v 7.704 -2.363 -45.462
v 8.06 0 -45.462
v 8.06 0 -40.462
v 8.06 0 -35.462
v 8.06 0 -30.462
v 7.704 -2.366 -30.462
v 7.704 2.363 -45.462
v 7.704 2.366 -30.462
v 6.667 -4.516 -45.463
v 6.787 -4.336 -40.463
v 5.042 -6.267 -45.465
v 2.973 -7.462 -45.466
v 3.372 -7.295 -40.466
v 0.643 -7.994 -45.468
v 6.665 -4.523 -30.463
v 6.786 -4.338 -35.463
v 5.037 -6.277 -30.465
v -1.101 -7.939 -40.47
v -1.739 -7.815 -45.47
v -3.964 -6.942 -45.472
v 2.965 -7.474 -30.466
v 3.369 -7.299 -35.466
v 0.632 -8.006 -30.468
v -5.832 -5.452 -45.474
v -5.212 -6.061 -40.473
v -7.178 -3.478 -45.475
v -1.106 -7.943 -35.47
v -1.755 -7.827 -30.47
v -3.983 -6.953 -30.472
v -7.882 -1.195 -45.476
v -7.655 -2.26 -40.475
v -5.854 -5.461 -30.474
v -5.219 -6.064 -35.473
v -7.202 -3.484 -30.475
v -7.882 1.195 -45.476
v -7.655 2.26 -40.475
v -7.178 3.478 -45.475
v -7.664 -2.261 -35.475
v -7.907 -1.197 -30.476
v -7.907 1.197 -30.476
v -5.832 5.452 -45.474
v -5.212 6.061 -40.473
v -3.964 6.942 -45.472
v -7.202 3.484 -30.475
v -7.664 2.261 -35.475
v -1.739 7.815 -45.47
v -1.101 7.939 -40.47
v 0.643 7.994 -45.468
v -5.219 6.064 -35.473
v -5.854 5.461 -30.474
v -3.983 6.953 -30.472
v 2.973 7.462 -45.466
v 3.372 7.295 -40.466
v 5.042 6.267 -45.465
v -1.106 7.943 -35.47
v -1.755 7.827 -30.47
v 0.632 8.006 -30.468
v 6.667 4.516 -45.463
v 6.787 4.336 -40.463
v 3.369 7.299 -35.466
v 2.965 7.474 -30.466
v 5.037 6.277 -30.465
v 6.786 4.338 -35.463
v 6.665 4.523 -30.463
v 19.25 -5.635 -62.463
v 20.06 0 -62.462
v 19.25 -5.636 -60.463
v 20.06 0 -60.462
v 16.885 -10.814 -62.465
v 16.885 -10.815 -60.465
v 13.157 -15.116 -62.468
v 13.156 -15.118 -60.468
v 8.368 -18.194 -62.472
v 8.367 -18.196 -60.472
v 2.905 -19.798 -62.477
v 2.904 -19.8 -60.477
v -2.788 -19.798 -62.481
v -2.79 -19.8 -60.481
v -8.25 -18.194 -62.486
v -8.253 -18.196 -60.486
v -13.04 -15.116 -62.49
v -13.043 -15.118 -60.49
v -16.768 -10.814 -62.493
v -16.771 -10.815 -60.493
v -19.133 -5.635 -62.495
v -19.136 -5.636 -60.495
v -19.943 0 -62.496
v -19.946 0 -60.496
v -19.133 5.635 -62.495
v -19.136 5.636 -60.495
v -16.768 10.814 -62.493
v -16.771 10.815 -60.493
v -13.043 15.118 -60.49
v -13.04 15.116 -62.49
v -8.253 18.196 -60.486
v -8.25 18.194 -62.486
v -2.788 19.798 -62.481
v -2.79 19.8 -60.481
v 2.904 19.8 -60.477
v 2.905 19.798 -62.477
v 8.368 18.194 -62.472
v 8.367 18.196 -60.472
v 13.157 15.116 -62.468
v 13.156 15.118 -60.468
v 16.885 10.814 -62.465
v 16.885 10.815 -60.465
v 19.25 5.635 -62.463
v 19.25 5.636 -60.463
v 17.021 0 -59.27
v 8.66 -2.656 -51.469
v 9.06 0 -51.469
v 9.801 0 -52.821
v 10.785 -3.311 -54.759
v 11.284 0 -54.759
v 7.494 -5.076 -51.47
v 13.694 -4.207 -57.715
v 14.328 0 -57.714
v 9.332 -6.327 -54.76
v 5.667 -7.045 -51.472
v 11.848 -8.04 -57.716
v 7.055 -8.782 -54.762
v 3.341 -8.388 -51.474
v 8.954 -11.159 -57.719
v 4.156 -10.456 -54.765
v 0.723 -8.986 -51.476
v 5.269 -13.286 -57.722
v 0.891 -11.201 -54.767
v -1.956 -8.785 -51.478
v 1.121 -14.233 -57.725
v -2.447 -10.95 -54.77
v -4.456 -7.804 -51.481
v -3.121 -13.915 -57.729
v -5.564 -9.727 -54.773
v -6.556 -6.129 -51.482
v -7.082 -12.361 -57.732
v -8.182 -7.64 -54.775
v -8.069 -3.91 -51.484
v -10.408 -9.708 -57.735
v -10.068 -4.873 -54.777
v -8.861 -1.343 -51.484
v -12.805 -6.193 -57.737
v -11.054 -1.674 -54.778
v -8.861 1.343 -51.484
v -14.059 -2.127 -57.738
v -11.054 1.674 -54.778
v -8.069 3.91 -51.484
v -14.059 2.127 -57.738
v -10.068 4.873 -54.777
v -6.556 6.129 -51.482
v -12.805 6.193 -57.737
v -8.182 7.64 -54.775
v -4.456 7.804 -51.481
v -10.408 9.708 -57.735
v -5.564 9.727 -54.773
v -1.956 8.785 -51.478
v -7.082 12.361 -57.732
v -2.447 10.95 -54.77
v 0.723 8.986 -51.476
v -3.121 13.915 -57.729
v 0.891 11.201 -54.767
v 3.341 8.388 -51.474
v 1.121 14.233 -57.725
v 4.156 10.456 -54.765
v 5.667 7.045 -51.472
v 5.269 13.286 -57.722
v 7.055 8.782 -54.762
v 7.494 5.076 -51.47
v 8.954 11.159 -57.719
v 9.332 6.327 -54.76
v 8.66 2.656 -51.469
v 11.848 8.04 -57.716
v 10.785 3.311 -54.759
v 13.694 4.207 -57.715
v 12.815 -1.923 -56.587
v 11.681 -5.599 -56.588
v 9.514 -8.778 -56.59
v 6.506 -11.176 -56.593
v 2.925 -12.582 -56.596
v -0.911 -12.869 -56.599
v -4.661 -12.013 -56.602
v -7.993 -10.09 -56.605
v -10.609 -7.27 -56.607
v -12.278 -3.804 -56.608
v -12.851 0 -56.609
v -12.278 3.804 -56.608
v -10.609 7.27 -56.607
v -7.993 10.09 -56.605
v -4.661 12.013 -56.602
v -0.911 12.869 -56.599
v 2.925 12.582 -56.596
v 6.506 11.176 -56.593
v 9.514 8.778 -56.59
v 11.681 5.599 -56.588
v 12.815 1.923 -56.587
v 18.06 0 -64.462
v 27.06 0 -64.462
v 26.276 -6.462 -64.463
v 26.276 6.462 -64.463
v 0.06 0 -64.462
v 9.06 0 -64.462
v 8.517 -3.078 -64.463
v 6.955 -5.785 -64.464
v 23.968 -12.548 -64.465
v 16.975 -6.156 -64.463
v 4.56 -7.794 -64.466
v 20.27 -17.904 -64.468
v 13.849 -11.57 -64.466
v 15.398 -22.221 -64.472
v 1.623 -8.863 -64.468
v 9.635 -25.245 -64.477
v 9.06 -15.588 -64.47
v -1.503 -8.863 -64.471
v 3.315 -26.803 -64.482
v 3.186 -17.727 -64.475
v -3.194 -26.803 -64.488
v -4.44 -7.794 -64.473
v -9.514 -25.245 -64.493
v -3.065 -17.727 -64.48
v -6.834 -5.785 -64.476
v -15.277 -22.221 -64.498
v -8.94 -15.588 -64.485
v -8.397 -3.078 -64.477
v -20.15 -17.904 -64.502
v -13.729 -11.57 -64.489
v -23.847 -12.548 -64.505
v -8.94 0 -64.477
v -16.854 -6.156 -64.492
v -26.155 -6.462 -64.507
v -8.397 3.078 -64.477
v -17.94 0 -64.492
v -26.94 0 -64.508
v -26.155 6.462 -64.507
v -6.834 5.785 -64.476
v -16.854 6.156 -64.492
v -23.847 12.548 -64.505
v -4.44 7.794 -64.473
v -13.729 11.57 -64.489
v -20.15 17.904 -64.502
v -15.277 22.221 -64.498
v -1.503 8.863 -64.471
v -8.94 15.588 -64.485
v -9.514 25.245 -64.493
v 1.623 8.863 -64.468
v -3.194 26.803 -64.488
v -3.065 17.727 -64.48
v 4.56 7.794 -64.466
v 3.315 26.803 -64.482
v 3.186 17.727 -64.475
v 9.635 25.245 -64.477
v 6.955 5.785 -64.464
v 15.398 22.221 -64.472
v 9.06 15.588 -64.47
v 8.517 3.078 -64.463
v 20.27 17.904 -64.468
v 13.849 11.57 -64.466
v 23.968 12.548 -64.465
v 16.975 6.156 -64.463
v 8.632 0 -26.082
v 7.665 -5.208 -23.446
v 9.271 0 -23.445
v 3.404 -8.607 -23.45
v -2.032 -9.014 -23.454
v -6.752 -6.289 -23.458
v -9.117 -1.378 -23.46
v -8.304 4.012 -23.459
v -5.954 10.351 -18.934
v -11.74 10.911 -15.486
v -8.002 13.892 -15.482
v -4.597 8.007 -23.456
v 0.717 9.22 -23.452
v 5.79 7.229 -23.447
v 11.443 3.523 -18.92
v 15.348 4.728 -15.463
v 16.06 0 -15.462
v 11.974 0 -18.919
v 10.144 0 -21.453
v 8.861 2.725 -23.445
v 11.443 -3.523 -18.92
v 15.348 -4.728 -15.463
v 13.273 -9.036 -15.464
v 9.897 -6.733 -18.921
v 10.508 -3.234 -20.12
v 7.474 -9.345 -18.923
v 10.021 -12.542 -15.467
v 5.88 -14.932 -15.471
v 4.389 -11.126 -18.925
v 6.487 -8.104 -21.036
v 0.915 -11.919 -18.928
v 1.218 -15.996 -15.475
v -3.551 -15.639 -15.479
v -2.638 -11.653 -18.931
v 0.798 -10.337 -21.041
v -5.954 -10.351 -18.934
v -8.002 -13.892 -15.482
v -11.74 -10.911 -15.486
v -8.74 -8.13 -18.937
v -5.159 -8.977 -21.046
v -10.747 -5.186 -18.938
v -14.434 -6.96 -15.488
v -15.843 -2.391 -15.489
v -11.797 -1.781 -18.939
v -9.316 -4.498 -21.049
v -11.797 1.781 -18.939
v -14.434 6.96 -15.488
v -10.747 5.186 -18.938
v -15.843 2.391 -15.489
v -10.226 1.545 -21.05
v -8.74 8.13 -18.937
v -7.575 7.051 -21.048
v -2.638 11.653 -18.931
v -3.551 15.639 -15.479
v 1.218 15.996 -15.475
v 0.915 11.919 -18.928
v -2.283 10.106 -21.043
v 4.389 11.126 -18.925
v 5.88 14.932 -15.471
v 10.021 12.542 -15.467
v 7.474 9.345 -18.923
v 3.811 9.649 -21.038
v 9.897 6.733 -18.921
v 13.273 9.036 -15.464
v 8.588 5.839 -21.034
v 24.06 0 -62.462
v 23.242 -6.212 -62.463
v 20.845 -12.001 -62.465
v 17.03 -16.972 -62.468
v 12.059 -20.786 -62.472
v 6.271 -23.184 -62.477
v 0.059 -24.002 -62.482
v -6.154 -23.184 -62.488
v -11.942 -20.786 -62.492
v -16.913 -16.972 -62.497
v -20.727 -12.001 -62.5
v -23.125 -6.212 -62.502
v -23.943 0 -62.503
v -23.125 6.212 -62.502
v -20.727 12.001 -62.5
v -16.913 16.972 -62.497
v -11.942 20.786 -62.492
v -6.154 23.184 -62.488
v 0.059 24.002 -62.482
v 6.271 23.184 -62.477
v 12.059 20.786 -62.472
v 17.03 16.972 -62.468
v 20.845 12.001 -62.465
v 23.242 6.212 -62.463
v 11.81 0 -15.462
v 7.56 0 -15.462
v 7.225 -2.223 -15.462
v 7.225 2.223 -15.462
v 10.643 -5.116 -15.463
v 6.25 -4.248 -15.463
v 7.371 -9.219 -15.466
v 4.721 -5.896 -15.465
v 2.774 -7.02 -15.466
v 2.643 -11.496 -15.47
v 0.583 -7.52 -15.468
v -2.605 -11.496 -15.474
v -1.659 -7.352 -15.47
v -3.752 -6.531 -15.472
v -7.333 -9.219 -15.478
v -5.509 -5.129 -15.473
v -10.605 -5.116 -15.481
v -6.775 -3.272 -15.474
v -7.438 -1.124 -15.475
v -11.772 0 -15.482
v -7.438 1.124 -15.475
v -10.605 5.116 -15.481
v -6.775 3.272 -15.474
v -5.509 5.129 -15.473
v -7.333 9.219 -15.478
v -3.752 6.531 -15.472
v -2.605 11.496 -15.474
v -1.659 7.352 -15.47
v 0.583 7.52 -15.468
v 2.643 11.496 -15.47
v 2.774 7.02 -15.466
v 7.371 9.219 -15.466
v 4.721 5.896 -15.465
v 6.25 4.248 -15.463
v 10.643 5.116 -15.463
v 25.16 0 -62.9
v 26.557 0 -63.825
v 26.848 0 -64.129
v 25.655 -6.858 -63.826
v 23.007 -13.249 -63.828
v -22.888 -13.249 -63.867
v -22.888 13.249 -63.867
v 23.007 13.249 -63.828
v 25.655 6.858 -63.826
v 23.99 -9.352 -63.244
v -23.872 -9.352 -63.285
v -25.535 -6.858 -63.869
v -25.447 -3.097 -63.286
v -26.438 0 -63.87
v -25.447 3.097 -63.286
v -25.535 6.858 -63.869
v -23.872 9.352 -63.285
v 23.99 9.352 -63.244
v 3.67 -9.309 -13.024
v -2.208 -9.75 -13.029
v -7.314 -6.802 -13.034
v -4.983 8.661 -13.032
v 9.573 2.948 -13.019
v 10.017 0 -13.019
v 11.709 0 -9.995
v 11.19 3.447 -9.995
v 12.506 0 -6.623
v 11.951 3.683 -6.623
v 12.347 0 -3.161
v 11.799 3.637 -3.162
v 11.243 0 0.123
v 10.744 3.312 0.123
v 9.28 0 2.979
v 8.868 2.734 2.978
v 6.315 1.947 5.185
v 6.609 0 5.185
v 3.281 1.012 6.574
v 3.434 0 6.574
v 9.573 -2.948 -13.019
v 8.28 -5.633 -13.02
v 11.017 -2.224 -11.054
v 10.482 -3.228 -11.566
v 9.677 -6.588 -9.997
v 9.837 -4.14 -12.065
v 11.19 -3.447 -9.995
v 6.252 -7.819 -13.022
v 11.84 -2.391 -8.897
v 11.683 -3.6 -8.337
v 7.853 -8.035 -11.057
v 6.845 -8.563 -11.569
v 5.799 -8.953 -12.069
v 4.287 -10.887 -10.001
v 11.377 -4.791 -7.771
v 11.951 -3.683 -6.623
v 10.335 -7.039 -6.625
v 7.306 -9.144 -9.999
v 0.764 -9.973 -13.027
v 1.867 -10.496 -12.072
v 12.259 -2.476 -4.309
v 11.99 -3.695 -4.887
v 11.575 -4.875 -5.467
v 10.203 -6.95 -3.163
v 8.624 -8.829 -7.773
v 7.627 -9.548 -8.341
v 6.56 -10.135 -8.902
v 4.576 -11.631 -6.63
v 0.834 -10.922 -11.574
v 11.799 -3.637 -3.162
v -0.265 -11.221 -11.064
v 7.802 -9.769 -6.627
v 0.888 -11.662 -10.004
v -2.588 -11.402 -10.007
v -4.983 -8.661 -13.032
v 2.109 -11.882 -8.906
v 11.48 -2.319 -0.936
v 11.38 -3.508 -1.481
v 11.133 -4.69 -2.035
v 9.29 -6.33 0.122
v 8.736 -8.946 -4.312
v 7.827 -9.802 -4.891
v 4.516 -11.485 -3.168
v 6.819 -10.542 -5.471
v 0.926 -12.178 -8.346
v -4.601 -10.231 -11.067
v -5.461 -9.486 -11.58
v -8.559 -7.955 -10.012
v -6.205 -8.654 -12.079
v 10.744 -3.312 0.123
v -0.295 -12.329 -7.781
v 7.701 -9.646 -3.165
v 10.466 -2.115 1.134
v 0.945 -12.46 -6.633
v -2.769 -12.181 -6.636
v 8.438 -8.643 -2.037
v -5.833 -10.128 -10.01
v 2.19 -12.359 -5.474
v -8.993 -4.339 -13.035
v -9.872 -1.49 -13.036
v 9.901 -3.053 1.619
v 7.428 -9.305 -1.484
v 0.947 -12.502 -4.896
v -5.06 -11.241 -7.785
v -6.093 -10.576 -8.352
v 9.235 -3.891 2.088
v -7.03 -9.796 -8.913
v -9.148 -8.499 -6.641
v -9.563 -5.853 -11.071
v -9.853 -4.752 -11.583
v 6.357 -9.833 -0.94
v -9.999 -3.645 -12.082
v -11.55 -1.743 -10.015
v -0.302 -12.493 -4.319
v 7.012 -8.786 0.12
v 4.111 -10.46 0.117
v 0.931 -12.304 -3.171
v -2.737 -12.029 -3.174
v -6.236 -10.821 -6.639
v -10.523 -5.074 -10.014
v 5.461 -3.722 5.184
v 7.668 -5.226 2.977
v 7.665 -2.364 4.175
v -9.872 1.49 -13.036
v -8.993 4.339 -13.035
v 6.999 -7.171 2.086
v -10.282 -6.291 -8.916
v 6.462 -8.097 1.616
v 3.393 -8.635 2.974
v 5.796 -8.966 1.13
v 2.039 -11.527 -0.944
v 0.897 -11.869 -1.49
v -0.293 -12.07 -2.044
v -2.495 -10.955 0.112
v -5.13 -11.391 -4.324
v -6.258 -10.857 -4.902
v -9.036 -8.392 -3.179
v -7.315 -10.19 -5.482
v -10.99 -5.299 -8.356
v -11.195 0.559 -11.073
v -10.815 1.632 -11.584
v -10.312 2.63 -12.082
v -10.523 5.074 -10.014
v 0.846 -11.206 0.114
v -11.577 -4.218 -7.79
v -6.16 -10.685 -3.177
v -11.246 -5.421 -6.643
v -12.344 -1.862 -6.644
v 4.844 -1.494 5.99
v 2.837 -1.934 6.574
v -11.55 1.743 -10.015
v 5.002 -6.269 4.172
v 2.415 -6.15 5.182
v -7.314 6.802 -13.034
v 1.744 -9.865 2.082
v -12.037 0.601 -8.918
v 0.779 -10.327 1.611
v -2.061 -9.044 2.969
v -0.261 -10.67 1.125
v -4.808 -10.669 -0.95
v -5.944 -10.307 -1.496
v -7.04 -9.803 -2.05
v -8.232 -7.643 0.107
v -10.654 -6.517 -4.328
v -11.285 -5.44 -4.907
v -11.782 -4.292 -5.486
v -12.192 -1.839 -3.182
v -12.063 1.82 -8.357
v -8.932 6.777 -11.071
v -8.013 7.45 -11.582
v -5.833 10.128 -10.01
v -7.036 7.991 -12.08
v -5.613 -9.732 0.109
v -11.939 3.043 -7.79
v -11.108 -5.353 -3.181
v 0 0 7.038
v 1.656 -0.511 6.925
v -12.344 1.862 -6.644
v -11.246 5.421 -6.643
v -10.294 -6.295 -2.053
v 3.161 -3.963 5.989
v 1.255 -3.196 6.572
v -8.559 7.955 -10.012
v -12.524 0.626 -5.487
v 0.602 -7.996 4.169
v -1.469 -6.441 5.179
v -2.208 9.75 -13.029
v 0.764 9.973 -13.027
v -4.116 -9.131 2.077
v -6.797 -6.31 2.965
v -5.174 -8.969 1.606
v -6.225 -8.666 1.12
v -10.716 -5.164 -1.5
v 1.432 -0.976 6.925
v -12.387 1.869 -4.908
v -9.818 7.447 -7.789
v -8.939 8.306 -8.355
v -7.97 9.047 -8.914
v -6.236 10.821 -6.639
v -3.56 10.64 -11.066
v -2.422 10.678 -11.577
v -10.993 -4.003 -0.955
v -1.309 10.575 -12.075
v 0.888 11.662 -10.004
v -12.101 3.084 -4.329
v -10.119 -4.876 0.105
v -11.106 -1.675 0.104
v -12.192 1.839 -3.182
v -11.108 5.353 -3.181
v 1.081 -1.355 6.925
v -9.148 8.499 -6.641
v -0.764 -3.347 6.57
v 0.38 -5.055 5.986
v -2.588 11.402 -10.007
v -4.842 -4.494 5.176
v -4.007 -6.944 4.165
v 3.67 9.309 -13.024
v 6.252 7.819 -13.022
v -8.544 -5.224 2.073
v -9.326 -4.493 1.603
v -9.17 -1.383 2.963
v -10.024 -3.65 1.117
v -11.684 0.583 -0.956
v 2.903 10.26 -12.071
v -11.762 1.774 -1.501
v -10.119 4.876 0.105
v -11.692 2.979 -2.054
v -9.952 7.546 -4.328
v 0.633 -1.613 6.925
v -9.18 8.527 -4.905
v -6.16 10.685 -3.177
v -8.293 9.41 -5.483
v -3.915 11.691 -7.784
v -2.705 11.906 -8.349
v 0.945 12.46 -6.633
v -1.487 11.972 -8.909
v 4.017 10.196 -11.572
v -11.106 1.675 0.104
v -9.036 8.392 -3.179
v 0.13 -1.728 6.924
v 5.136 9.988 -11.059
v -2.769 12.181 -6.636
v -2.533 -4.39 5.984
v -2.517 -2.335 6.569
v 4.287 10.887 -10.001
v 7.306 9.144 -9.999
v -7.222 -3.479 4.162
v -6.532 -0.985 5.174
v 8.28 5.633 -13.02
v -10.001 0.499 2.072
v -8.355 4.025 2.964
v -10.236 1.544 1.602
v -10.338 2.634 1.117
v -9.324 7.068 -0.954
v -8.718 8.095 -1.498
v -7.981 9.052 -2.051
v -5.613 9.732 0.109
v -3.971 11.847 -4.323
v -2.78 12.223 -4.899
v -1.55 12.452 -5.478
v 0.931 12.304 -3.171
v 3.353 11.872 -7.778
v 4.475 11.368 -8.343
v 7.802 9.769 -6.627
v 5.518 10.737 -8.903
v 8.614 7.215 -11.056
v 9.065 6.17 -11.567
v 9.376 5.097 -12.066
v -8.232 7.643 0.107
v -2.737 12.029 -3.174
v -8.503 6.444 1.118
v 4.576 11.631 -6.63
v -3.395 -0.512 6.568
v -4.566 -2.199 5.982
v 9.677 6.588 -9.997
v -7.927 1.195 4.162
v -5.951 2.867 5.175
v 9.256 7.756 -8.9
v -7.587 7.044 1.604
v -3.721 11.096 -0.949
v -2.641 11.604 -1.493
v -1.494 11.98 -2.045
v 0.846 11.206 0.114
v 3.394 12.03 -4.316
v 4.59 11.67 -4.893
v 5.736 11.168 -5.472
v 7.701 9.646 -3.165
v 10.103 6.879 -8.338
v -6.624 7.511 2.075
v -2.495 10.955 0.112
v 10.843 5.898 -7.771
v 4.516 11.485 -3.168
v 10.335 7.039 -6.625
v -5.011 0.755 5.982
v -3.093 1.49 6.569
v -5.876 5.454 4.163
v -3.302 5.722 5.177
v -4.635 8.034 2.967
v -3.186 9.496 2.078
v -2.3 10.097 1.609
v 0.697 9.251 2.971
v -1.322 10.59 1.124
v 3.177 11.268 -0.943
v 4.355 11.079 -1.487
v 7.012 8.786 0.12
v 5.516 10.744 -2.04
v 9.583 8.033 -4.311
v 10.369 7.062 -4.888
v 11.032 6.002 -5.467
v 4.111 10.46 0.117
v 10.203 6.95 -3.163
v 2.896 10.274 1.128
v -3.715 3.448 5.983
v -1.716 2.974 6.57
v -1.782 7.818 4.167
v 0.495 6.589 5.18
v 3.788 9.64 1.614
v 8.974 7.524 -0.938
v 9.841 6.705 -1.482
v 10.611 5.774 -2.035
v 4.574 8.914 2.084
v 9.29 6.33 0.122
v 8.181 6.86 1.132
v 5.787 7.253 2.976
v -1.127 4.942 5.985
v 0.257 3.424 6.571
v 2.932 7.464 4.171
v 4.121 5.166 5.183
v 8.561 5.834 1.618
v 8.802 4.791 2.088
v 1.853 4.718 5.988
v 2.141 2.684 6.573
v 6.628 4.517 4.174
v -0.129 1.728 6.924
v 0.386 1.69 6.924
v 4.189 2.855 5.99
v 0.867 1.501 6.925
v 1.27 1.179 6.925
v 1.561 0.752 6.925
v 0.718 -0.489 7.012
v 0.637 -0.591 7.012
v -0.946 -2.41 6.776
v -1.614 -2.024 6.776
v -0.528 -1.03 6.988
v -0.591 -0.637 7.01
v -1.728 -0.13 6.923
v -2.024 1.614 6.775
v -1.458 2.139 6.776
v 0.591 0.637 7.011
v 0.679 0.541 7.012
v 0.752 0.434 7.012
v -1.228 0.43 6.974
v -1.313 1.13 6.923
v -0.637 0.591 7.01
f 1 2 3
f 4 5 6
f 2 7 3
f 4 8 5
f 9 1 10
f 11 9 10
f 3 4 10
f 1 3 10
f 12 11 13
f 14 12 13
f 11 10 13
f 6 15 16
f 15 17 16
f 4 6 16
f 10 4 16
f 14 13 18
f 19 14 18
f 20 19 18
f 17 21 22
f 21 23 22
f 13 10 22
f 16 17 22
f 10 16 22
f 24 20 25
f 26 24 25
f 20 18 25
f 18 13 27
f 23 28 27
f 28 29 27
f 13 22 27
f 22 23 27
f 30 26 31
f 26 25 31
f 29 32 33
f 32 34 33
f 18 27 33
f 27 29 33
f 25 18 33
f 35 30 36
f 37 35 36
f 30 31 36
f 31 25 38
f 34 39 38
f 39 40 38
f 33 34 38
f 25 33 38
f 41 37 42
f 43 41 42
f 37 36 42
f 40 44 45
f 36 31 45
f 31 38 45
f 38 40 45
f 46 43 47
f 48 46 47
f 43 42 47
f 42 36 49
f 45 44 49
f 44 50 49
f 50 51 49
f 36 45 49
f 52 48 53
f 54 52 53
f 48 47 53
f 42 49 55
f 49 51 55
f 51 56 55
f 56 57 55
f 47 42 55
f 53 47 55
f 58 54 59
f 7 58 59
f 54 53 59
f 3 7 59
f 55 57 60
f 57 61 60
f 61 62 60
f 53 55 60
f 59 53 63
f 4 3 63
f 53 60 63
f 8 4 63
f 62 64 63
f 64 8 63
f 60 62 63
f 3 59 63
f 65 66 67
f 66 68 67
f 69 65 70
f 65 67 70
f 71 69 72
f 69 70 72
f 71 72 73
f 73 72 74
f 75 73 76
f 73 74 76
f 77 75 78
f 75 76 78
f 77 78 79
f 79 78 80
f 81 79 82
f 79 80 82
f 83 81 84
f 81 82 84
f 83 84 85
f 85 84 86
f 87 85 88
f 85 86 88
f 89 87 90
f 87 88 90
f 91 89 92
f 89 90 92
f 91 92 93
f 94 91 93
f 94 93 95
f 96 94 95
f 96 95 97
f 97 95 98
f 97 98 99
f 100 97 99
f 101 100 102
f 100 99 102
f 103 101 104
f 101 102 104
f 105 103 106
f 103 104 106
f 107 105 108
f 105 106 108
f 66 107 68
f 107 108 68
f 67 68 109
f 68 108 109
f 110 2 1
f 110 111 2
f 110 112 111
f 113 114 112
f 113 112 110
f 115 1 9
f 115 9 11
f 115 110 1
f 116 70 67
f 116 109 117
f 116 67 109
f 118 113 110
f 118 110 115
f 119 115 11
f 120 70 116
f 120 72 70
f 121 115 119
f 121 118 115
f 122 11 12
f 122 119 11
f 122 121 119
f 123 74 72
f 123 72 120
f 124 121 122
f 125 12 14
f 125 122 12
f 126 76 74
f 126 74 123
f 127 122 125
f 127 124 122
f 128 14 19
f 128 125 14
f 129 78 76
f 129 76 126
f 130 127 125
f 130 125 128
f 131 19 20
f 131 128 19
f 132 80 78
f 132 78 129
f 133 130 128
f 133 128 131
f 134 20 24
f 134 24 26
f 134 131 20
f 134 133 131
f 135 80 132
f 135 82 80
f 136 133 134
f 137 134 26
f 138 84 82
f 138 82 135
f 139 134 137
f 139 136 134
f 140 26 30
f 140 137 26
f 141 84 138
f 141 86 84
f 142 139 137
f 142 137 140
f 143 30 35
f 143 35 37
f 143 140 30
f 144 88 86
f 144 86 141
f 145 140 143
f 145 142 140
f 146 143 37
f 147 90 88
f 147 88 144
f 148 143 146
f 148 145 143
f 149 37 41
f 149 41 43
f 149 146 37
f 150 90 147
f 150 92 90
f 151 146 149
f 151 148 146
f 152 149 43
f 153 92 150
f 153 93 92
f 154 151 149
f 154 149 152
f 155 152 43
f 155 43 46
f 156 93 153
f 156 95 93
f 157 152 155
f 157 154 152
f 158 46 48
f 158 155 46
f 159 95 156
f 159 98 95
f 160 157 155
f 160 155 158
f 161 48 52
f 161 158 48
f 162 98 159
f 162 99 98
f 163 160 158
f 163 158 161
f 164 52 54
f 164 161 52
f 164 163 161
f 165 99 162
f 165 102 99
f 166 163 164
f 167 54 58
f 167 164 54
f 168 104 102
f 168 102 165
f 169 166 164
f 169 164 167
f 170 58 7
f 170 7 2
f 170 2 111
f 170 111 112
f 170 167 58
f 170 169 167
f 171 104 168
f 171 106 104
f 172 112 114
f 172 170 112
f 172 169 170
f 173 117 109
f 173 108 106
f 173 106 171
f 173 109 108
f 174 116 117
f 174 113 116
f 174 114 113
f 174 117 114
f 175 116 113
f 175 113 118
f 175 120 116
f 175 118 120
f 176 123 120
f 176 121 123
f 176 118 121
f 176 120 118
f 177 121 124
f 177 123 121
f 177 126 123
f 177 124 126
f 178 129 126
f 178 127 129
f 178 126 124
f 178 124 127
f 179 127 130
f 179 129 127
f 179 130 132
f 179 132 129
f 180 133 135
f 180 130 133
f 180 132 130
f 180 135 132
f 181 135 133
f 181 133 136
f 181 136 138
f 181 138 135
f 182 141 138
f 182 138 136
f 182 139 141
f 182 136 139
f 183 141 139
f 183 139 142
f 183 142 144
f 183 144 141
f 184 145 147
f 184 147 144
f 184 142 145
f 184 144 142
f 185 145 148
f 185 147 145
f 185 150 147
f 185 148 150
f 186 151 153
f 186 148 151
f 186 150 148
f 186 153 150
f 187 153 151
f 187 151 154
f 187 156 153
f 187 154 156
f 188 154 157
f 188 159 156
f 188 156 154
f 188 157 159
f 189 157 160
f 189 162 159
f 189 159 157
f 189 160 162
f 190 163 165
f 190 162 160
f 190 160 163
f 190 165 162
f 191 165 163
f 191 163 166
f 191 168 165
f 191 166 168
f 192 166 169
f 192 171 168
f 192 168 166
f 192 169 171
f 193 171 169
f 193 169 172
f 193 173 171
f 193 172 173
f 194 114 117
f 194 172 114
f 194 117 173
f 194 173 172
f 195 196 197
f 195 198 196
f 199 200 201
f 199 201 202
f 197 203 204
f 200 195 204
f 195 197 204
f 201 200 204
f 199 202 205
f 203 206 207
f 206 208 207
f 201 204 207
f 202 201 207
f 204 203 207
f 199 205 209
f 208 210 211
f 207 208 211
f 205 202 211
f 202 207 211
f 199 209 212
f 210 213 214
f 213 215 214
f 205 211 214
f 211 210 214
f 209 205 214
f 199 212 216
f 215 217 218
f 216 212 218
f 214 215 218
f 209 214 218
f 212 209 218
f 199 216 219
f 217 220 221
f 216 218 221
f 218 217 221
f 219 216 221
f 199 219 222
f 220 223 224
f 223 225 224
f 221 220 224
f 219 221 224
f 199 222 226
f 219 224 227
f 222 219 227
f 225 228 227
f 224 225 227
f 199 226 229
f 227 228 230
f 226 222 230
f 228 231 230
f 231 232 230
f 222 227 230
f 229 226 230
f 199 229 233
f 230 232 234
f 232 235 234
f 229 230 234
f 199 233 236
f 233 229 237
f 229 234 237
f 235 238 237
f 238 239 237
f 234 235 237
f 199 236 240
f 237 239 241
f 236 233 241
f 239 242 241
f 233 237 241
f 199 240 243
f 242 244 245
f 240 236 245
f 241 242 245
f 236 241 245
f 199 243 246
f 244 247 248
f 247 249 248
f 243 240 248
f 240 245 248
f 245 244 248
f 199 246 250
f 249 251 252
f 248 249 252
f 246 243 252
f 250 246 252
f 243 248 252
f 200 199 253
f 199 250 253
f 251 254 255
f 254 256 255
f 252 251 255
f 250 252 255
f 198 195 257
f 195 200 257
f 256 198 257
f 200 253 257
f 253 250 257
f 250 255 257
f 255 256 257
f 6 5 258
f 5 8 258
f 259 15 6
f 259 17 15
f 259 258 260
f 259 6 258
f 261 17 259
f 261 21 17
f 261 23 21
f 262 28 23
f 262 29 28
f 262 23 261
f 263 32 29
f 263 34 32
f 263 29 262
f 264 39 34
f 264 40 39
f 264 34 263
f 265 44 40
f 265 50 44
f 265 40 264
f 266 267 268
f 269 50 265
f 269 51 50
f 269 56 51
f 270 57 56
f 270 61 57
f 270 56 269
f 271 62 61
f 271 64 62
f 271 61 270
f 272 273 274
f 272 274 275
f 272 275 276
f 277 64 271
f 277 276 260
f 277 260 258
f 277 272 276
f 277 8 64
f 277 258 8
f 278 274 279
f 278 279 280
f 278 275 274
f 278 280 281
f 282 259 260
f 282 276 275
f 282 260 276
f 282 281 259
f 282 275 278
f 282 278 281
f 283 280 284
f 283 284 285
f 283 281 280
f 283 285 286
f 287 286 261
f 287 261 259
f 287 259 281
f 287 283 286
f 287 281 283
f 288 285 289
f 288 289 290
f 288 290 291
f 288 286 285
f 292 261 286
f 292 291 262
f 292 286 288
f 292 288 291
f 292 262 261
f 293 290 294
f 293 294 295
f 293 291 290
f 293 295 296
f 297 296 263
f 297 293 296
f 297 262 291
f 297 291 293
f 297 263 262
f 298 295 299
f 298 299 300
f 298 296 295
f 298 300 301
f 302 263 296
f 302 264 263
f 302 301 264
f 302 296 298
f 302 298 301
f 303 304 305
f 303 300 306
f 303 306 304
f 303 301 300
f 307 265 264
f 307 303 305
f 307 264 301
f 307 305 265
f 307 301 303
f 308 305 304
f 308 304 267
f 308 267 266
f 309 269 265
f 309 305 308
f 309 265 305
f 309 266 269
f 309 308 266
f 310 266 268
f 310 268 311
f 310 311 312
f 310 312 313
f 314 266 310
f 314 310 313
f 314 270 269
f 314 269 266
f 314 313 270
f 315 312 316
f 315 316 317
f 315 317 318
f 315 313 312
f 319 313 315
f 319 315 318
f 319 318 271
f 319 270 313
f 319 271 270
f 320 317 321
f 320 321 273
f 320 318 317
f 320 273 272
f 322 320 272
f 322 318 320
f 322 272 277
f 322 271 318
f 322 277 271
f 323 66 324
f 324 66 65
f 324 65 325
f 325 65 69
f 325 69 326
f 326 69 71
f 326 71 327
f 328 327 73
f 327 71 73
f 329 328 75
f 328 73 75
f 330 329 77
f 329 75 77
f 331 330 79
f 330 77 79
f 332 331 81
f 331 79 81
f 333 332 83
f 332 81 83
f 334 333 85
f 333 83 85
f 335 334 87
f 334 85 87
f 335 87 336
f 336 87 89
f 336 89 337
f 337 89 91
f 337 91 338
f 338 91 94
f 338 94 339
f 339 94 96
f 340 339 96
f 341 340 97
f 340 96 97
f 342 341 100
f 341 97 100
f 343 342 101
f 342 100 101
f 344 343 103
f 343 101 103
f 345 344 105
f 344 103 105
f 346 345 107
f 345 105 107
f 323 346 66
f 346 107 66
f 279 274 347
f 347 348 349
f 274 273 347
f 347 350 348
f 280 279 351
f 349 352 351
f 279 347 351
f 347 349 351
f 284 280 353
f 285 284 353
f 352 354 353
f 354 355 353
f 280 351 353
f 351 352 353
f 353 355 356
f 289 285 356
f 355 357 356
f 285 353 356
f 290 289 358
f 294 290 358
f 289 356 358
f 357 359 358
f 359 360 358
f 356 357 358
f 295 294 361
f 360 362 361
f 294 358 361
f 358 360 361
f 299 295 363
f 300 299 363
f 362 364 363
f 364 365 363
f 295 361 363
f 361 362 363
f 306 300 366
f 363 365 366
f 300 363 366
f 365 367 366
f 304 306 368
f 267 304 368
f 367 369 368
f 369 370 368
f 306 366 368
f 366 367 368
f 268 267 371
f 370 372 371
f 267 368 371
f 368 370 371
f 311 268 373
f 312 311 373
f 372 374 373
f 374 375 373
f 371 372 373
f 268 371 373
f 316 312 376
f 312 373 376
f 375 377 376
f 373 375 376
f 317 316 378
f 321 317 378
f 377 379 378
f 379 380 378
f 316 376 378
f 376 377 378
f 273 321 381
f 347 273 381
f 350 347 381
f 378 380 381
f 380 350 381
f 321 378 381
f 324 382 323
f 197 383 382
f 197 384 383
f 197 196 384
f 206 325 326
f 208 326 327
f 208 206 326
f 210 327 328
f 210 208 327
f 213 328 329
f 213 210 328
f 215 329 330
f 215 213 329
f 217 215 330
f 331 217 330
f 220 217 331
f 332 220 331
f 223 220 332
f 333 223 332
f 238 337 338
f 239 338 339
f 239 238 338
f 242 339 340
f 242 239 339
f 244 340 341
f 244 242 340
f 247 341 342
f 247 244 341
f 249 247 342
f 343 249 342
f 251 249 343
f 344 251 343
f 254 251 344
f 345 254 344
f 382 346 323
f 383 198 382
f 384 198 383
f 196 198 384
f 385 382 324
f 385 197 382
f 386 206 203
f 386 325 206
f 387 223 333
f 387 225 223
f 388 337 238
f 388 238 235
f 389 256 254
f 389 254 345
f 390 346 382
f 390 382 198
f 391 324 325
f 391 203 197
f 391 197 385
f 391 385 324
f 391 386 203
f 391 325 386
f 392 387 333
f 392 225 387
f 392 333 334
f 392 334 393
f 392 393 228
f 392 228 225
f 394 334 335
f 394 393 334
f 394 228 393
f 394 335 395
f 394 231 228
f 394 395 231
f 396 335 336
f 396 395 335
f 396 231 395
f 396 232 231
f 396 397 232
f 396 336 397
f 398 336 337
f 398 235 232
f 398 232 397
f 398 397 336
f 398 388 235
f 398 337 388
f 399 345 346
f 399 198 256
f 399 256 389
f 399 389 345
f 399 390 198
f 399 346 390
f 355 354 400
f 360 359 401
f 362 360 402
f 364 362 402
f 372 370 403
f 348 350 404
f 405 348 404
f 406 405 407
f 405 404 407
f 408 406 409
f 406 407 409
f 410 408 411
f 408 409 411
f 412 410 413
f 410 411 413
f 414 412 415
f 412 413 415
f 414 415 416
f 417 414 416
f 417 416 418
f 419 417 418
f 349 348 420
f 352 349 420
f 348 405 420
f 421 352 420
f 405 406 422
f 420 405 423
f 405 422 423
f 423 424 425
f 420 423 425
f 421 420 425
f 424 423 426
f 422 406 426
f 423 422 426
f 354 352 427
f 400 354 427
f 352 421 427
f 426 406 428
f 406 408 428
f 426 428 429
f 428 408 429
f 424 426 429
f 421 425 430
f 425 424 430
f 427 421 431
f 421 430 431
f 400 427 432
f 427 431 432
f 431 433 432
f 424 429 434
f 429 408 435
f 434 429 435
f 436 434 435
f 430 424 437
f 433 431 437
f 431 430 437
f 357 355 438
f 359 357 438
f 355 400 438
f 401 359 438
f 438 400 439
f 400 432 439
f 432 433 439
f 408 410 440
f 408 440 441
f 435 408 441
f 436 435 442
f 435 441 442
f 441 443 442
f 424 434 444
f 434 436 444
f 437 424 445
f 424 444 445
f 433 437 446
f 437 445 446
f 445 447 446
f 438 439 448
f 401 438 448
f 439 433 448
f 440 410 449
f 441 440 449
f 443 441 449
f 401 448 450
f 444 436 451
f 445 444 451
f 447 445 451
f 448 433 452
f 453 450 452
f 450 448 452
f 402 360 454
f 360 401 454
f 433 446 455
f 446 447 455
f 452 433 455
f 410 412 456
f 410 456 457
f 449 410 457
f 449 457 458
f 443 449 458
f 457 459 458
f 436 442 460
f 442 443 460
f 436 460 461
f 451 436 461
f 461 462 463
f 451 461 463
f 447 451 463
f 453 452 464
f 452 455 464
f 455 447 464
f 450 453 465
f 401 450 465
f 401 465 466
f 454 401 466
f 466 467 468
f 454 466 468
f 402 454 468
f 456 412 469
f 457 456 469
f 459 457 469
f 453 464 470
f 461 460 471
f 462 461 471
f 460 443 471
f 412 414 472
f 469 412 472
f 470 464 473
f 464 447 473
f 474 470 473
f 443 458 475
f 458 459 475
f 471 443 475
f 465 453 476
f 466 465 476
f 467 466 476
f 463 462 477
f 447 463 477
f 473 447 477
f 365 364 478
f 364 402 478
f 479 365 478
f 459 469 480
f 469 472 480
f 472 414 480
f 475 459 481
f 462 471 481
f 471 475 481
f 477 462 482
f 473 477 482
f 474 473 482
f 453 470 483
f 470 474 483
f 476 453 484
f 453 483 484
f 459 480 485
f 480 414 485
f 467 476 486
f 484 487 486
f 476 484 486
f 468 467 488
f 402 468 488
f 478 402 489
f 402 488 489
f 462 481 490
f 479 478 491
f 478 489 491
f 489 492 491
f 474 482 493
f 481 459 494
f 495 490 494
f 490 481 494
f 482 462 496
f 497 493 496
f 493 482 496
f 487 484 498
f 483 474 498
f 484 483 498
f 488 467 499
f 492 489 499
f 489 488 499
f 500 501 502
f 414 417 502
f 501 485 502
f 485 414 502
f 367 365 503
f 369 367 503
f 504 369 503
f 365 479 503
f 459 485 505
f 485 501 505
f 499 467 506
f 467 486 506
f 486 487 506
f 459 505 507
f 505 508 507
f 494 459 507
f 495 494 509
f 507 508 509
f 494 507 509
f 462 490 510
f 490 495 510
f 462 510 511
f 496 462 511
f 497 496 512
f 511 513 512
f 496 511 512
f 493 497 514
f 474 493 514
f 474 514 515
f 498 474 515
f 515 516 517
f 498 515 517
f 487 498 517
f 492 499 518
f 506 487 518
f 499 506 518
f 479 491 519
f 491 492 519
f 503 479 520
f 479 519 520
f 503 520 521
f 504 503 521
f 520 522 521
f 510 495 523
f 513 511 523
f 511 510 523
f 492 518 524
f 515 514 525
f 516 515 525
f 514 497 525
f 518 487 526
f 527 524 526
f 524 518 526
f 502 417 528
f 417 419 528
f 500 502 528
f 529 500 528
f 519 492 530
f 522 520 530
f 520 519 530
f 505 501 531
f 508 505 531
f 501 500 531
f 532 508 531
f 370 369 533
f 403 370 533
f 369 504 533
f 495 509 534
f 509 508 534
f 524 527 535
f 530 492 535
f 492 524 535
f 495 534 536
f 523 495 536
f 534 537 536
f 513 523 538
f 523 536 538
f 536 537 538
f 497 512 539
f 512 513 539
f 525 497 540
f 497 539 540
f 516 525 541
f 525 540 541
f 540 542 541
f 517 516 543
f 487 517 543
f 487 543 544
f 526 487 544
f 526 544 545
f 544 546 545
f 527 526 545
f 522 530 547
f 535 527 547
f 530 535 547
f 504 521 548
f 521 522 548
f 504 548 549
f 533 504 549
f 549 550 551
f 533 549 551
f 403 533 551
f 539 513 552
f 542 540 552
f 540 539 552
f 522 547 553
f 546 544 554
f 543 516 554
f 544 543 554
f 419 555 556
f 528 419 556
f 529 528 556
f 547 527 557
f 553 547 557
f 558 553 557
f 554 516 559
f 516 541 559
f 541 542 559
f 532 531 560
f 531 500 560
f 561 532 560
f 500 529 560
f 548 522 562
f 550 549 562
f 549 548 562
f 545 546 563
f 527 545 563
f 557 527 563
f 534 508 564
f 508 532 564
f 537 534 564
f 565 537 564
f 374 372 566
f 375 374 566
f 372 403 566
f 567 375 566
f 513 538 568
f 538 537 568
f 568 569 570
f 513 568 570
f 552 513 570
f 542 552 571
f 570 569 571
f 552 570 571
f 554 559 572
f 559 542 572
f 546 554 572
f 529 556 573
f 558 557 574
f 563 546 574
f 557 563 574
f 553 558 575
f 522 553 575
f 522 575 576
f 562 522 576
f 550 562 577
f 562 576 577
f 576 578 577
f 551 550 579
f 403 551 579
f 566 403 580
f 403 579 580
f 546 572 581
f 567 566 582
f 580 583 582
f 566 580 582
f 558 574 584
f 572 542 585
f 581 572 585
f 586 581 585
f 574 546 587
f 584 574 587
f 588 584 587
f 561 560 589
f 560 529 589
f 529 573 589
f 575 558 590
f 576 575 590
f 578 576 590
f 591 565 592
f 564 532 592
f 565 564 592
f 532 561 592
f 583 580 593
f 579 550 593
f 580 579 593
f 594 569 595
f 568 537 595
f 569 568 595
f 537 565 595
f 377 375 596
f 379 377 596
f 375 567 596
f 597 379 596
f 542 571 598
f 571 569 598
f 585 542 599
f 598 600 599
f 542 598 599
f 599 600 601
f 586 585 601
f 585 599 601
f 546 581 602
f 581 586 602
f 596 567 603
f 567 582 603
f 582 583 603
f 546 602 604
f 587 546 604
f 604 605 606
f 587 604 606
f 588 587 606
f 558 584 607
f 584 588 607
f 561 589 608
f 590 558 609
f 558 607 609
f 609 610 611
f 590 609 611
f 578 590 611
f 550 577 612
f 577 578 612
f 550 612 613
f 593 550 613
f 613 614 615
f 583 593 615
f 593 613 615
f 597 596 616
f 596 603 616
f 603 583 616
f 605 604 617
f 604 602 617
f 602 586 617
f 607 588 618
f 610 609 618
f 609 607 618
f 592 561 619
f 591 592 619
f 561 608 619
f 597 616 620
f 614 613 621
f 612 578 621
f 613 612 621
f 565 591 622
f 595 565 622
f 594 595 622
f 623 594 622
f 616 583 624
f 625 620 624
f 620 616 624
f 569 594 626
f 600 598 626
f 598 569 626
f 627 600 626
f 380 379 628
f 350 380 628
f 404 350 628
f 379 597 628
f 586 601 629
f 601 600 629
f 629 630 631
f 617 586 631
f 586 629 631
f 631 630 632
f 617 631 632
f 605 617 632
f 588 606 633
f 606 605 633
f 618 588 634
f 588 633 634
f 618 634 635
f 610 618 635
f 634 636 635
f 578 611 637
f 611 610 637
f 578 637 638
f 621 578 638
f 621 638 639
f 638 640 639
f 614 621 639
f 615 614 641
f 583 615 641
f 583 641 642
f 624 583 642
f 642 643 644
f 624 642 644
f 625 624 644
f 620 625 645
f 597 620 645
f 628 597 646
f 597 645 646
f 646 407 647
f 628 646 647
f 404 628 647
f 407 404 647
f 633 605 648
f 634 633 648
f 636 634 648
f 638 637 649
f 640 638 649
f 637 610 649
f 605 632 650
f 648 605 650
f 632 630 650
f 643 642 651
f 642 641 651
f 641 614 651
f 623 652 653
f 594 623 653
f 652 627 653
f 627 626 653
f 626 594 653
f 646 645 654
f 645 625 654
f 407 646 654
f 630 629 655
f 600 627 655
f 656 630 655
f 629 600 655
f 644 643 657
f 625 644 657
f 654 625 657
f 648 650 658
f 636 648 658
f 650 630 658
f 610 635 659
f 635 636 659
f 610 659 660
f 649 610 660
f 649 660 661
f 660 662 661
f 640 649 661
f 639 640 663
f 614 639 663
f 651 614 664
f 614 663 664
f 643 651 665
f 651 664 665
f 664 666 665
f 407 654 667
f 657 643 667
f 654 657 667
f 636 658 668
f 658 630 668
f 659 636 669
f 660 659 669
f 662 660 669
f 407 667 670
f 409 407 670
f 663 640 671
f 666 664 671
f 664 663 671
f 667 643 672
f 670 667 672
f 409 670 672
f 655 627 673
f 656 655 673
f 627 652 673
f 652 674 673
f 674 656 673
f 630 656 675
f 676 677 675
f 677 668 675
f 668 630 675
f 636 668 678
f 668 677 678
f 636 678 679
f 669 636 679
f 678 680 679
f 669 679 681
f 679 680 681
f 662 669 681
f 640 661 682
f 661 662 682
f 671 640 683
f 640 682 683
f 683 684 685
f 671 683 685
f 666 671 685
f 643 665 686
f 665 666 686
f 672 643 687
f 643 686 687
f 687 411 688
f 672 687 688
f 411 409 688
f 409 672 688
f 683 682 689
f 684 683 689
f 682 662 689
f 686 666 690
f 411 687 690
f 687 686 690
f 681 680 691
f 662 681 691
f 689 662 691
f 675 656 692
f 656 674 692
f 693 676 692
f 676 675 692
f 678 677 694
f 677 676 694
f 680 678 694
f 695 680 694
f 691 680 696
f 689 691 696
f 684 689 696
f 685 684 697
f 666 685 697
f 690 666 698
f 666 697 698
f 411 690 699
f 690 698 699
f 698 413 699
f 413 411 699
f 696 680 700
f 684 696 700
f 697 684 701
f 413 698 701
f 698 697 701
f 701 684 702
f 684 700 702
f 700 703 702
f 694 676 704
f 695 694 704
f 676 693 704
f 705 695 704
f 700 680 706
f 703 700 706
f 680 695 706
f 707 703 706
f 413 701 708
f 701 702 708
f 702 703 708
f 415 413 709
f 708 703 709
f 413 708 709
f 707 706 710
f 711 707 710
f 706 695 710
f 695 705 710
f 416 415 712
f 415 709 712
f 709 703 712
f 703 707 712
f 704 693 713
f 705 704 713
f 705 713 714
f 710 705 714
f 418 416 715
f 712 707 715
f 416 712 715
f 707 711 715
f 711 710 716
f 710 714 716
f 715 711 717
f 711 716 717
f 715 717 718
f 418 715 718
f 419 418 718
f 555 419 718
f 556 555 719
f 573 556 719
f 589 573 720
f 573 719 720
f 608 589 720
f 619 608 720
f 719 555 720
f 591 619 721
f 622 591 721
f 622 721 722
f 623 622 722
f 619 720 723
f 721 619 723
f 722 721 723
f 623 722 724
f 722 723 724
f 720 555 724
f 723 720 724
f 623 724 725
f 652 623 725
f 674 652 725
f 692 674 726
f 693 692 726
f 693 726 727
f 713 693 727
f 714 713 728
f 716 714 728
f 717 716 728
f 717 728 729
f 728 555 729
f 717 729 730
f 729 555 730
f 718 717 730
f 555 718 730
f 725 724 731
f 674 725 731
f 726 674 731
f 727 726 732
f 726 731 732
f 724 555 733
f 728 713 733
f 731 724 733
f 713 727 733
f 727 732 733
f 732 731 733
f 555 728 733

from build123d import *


with BuildPart() as f1:
    # F0 (on Front) → F1 (revolve)
    with BuildSketch(Plane.XZ):
        with BuildLine():
            Line((16.0602549567, -15.4621153726), (7.5602549567, -15.4621153726))
            ThreePointArc((7.5602549567, -15.4621153726), (11.9092345657, -1.4806982601), (0, 7.0377394002))
            Line((0, 7.0377394002), (0.0210680353, -17.9620539479))
            Line((0.0210680353, -17.9620539479), (0.0602549567, -64.4621153726))
            Line((0.0602549567, -64.4621153726), (27.0602549567, -64.4621153726))
            add(Edge.make_bspline(
                [(24.0602549567, -62.4621153726), (24.2976343533, -62.5299482609), (24.6610161779, -62.659273132), (25.3953288411, -63.000628175), (26.1296100935, -63.488961221), (26.6120109423, -63.8396804611), (26.9844977473, -64.2711132928), (27.0602549567, -64.4621153726)],
                knots=[0, 0, 0, 0, 0.1871194335, 0.395890859, 0.6146239818, 0.7997660524, 1, 1, 1, 1], degree=3))
            Line((24.0602549567, -62.4621153726), (20.0602549567, -62.4621153726))
            Line((20.0602549567, -62.4621153726), (20.0602549567, -60.4621153726))
            add(Edge.make_bspline(
                [(8.0602549567, -45.4621153726), (8.1202179338, -46.2604888161), (8.4882346329, -48.7671795342), (8.8159630246, -51.106048365), (9.7836826184, -53.012188928), (12.8822067968, -56.7280350203), (14.674401585, -57.9681740481), (16.0955126132, -58.8286453234), (17.1337599051, -59.3246168108), (18.2158143663, -59.8336196795), (19.4334469038, -60.3452031361), (20.0602549567, -60.4621153726)],
                knots=[0, 0, 0, 0, 0.1359045694, 0.2517978021, 0.3615656635, 0.5258739798, 0.6392079546, 0.7333337546, 0.8126882779, 0.8949414167, 1, 1, 1, 1], degree=3))
            Line((8.0602549567, -45.4621153726), (8.0602549567, -30.4621153726))
            add(Edge.make_bspline(
                [(16.0602549567, -15.4621153726), (15.6748016449, -15.7156297876), (14.8363137229, -16.2524384887), (13.3584036697, -17.6179345625), (11.8257365644, -18.9579435855), (10.3041434737, -21.0251573137), (9.2249686684, -23.247421733), (8.5995600709, -26.0760591157), (8.3121636182, -28.1564764322), (8.0995725705, -29.7078921018), (8.0602549567, -30.4621153726)],
                knots=[0, 0, 0, 0, 0.1009164062, 0.2194508043, 0.3405479184, 0.473970684, 0.607526809, 0.7495865753, 0.8727033634, 1, 1, 1, 1], degree=3))
        make_face()
    revolve(axis=Axis((0.0301274783, 0, -28.7121879862), (0.0008427281, 0, -0.9999996449)))


solid = f1.part
